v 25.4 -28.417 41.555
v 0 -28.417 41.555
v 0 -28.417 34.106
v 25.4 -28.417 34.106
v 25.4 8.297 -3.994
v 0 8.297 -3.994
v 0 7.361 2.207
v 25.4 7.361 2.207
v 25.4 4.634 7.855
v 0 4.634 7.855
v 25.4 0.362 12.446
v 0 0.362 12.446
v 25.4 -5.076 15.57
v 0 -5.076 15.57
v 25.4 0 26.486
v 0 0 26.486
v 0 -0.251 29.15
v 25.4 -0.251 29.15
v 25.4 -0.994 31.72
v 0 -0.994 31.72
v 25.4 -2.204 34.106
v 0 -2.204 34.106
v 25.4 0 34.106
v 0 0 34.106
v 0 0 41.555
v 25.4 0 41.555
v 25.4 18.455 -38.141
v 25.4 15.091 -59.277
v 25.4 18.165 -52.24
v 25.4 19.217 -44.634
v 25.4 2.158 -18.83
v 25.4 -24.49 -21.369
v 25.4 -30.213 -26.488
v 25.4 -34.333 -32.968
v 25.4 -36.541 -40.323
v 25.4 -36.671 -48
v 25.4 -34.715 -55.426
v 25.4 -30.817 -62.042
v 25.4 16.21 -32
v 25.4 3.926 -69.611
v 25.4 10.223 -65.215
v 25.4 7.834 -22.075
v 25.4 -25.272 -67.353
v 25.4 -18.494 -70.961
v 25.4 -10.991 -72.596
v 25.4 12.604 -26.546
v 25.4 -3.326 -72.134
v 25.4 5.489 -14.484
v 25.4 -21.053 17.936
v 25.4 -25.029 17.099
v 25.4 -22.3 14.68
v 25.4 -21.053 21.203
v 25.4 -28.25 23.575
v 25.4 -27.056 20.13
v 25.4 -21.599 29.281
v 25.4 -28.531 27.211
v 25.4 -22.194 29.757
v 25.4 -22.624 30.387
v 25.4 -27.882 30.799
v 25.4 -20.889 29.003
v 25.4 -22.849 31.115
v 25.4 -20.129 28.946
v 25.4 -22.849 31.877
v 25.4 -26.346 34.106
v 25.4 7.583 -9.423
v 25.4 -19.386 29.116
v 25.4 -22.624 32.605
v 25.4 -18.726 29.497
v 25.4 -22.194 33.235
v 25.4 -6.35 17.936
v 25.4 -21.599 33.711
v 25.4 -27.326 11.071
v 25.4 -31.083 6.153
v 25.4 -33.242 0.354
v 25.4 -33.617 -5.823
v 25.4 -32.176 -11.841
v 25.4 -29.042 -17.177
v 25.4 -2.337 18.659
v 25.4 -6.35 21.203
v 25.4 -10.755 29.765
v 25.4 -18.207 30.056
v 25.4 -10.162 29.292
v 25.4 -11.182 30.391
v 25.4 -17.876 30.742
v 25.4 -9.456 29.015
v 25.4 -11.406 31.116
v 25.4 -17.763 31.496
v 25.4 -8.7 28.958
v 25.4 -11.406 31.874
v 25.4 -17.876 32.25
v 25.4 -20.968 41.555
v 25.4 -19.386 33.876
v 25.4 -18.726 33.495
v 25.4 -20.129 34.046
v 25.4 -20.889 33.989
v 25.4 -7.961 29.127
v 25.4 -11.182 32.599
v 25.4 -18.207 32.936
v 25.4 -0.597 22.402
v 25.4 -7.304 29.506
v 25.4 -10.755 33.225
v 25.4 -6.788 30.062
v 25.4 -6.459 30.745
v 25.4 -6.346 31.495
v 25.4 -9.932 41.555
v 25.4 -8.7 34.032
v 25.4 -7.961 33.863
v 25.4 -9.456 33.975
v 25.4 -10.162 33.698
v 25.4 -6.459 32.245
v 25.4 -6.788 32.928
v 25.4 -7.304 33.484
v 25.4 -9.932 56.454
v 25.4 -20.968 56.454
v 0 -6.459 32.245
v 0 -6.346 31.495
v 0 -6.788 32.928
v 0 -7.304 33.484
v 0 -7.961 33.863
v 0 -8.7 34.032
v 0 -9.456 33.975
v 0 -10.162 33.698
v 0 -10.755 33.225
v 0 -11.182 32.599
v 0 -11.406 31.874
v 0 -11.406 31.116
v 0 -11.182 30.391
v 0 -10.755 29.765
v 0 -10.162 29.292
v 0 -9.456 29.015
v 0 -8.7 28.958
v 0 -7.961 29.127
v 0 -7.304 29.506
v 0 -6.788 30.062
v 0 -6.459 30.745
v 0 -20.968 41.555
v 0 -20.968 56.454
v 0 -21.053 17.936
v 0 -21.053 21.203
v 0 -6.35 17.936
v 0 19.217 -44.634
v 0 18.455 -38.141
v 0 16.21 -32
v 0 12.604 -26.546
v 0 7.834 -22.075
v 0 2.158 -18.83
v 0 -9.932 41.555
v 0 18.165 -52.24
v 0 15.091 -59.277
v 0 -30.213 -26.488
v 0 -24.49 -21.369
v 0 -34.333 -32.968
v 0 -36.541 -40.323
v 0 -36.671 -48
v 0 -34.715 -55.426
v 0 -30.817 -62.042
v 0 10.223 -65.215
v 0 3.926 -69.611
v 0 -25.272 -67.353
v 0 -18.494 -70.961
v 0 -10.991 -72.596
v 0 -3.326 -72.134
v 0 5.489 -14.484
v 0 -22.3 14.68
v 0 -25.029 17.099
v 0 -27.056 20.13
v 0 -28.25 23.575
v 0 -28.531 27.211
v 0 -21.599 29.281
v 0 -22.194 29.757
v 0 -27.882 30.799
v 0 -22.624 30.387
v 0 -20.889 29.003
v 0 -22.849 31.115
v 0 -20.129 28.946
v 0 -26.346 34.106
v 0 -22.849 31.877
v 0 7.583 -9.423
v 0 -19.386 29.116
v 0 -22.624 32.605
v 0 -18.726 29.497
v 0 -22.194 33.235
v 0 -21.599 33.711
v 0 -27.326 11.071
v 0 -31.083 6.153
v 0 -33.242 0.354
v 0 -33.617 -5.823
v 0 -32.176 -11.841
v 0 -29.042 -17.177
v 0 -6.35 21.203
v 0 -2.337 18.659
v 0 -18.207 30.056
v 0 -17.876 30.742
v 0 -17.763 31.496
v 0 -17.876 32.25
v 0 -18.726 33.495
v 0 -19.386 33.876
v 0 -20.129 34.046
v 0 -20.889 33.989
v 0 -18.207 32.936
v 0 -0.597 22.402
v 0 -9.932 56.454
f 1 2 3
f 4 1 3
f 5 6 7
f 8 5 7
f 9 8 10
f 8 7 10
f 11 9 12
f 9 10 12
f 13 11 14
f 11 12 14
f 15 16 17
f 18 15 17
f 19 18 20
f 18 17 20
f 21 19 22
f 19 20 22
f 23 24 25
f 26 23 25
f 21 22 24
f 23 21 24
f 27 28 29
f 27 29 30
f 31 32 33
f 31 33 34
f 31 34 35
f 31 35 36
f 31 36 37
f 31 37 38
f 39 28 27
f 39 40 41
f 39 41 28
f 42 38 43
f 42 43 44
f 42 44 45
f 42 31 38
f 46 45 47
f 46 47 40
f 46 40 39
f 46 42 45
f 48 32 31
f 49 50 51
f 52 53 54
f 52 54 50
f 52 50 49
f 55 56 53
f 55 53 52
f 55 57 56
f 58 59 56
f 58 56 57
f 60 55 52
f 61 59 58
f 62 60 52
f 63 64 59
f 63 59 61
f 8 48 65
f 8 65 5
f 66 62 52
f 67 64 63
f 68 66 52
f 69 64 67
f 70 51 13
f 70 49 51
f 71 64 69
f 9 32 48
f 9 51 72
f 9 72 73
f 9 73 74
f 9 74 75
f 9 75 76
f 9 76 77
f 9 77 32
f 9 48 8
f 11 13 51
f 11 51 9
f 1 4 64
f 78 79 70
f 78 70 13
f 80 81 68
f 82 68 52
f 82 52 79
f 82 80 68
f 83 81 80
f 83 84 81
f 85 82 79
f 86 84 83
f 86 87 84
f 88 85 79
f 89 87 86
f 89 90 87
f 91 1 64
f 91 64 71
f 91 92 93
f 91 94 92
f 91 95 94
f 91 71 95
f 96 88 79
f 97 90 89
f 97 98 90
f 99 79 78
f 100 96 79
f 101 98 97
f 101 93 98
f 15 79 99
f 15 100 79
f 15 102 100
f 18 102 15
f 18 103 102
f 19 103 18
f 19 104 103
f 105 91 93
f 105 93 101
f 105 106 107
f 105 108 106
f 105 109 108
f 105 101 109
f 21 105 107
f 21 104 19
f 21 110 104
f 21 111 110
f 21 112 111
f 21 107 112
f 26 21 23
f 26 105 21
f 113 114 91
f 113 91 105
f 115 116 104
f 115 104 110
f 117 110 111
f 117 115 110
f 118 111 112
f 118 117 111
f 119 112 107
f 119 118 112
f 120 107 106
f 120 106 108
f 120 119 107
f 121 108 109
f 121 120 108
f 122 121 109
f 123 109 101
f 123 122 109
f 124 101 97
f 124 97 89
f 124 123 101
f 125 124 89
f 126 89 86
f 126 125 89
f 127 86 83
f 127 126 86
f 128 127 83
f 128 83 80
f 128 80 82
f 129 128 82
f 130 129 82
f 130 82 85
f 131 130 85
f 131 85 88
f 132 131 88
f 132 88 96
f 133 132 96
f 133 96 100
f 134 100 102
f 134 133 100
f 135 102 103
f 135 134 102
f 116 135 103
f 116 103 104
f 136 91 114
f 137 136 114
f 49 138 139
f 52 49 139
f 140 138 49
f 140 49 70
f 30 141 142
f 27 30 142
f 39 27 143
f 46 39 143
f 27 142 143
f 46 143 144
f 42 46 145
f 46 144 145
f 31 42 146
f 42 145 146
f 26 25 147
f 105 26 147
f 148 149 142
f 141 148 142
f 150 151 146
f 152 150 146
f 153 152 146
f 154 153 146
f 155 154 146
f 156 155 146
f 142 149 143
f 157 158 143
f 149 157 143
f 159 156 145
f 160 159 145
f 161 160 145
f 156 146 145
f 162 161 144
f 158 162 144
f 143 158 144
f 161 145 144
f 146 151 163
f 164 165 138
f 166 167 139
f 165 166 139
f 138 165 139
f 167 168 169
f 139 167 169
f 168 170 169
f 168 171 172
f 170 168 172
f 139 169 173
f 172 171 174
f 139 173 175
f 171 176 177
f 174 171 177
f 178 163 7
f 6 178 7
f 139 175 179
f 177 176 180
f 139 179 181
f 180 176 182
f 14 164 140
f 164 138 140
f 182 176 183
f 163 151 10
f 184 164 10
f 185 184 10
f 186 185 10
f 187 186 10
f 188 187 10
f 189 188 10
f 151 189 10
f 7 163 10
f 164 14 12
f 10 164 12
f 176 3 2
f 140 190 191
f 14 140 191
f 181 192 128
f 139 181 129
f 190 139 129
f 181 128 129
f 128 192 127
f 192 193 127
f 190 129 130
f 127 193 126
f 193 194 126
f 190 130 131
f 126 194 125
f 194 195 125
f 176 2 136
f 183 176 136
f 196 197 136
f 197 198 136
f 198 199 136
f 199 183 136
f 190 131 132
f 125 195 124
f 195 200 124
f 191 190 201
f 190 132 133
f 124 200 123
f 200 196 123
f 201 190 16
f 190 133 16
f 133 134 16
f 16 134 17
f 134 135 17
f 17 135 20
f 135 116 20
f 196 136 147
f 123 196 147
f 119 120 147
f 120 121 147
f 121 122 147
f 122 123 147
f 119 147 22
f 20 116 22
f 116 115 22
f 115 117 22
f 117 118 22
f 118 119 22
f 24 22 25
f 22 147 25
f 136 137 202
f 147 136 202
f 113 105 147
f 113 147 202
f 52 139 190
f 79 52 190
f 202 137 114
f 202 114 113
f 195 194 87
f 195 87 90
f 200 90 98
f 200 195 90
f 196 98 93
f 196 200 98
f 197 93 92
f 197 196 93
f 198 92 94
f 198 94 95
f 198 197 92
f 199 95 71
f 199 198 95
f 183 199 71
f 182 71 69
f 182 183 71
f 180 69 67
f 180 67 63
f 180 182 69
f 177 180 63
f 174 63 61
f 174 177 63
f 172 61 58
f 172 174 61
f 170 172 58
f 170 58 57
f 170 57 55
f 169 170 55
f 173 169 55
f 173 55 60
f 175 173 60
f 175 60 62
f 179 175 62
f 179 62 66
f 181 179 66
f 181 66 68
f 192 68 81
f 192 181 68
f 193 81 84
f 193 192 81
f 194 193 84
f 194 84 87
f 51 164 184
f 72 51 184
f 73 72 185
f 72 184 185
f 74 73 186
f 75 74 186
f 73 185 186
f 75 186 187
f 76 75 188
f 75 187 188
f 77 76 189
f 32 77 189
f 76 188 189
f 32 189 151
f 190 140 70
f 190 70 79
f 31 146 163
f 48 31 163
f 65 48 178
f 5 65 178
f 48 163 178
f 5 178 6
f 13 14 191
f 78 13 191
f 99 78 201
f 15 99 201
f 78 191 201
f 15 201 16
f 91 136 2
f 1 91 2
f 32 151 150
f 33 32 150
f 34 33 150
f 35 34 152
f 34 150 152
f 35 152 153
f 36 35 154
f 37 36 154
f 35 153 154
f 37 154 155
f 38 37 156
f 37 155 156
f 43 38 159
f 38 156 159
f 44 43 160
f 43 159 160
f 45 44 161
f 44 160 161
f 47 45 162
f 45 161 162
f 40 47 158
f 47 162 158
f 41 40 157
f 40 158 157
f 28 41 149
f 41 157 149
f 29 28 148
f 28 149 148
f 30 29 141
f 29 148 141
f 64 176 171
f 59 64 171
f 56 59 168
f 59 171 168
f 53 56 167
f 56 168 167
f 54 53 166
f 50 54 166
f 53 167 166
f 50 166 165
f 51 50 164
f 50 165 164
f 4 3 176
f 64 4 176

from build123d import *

# Parameters (mm, degrees)
F0_W     = 11.0358623788
F0_H     = 14.8984193802
F1_DEPTH = 25.4
F2_DEPTH = 25.4
F3_R     = 2.5571153932
F3_R_2   = 2.5440351013
F3_W     = 14.7031287464
F3_H     = 3.2673614761
F4_DEPTH = 25.4


# Not quite as in the source:
# - the program builds the solid bodies; features that only make, move or delete a surface that nothing else refers to are left out


with BuildPart() as f1:
    # F0 (on Right) → F1 (new body)
    with BuildSketch(Plane.YZ):
        with BuildLine():
            ThreePointArc((-24.4896995825, -21.3687317689), (-22.0066937129, -69.3902825337), (19.2165729762, -44.633931036))
            ThreePointArc((19.2165729762, -44.633931036), (14.5664371428, -29.167684068), (2.1580914014, -18.8302997515))
            ThreePointArc((2.1580914014, -18.8302997515), (-10.7088530026, -24.8964679727), (-24.4896995825, -21.3687317689))
        make_face()
        with BuildLine():
            ThreePointArc((-24.4896995825, -21.3687317689), (-10.7088530026, -24.8964679727), (2.1580914014, -18.8302997515))
            ThreePointArc((2.1580914014, -18.8302997515), (-11.4882033251, -16.7150534797), (-24.4896995825, -21.3687317689))
        make_face()
        with BuildLine():
            ThreePointArc((-24.4896995825, -21.3687317689), (-11.4882033251, -16.7150534797), (2.1580914014, -18.8302997515))
            ThreePointArc((2.1580914014, -18.8302997515), (6.7017838768, -12.0221001394), (8.2971597307, -3.993931036))
            ThreePointArc((8.2971597307, -3.993931036), (4.6343580327, 7.8551511373), (-5.0761488644, 15.5702610153))
            ThreePointArc((-5.0761488644, 15.5702610153), (-13.5382573111, 12.2302712352), (-22.2995232661, 14.6803793882))
            ThreePointArc((-22.2995232661, 14.6803793882), (-33.6585141964, -2.7205891991), (-24.4896995825, -21.3687317689))
        make_face()
        with BuildLine():
            ThreePointArc((-26.3456820786, 34.106068964), (-28.2496986989, 23.5752529976), (-22.2995232661, 14.6803793882))
            ThreePointArc((-22.2995232661, 14.6803793882), (-13.7834170108, 16.9752588467), (-5.0761488644, 15.5702610153))
            ThreePointArc((-5.0761488644, 15.5702610153), (-1.3310983759, 20.4668881546), (0, 26.486068964))
            ThreePointArc((0, 26.486068964), (-0.5620509112, 30.4522310833), (-2.2039436985, 34.106068964))
            Line((-2.2039436985, 34.106068964), (-26.3456820786, 34.106068964))
        make_face()
        with BuildLine():
            ThreePointArc((-5.0761488644, 15.5702610153), (-13.7834170108, 16.9752588467), (-22.2995232661, 14.6803793882))
            ThreePointArc((-22.2995232661, 14.6803793882), (-13.5382573111, 12.2302712352), (-5.0761488644, 15.5702610153))
        make_face()
        with BuildLine():
            Line((-28.4173451364, 34.106068964), (-26.3456820786, 34.106068964))
            ThreePointArc((-26.3456820786, 34.106068964), (-14.2748128886, 40.7608818526), (-2.2039436985, 34.106068964))
            Line((-2.2039436985, 34.106068964), (0, 34.106068964))
            Line((0, 34.106068964), (0, 41.5552749288))
            Line((0, 41.5552749288), (-9.9322767928, 41.5552749288))
            Line((-9.9322767928, 41.5552749288), (-20.9681391716, 41.5552749288))
            Line((-20.9681391716, 41.5552749288), (-28.4173451364, 41.5552749288))
            Line((-28.4173451364, 41.5552749288), (-28.4173451364, 34.106068964))
        make_face()
        with BuildLine():
            ThreePointArc((-2.2039436985, 34.106068964), (-14.2748128886, 40.7608818526), (-26.3456820786, 34.106068964))
            Line((-26.3456820786, 34.106068964), (-2.2039436985, 34.106068964))
        make_face()
        with Locations((-15.4502079822, 49.0044846189)):
            Rectangle(F0_W, F0_H)
    extrude(amount=F1_DEPTH)

    # F0 (on Right) → F2 (join)
    with BuildSketch(Plane.YZ):
        with BuildLine():
            ThreePointArc((-24.4896995825, -21.3687317689), (-22.0066937129, -69.3902825337), (19.2165729762, -44.633931036))
            ThreePointArc((19.2165729762, -44.633931036), (14.5664371428, -29.167684068), (2.1580914014, -18.8302997515))
            ThreePointArc((2.1580914014, -18.8302997515), (-10.7088530026, -24.8964679727), (-24.4896995825, -21.3687317689))
        make_face()
        with BuildLine():
            ThreePointArc((-24.4896995825, -21.3687317689), (-10.7088530026, -24.8964679727), (2.1580914014, -18.8302997515))
            ThreePointArc((2.1580914014, -18.8302997515), (-11.4882033251, -16.7150534797), (-24.4896995825, -21.3687317689))
        make_face()
        with BuildLine():
            ThreePointArc((-24.4896995825, -21.3687317689), (-11.4882033251, -16.7150534797), (2.1580914014, -18.8302997515))
            ThreePointArc((2.1580914014, -18.8302997515), (6.7017838768, -12.0221001394), (8.2971597307, -3.993931036))
            ThreePointArc((8.2971597307, -3.993931036), (4.6343580327, 7.8551511373), (-5.0761488644, 15.5702610153))
            ThreePointArc((-5.0761488644, 15.5702610153), (-13.5382573111, 12.2302712352), (-22.2995232661, 14.6803793882))
            ThreePointArc((-22.2995232661, 14.6803793882), (-33.6585141964, -2.7205891991), (-24.4896995825, -21.3687317689))
        make_face()
        with BuildLine():
            ThreePointArc((-26.3456820786, 34.106068964), (-28.2496986989, 23.5752529976), (-22.2995232661, 14.6803793882))
            ThreePointArc((-22.2995232661, 14.6803793882), (-13.7834170108, 16.9752588467), (-5.0761488644, 15.5702610153))
            ThreePointArc((-5.0761488644, 15.5702610153), (-1.3310983759, 20.4668881546), (0, 26.486068964))
            ThreePointArc((0, 26.486068964), (-0.5620509112, 30.4522310833), (-2.2039436985, 34.106068964))
            Line((-2.2039436985, 34.106068964), (-26.3456820786, 34.106068964))
        make_face()
        with BuildLine():
            ThreePointArc((-5.0761488644, 15.5702610153), (-13.7834170108, 16.9752588467), (-22.2995232661, 14.6803793882))
            ThreePointArc((-22.2995232661, 14.6803793882), (-13.5382573111, 12.2302712352), (-5.0761488644, 15.5702610153))
        make_face()
        with BuildLine():
            Line((-28.4173451364, 34.106068964), (-26.3456820786, 34.106068964))
            ThreePointArc((-26.3456820786, 34.106068964), (-14.2748128886, 40.7608818526), (-2.2039436985, 34.106068964))
            Line((-2.2039436985, 34.106068964), (0, 34.106068964))
            Line((0, 34.106068964), (0, 41.5552749288))
            Line((0, 41.5552749288), (-9.9322767928, 41.5552749288))
            Line((-9.9322767928, 41.5552749288), (-20.9681391716, 41.5552749288))
            Line((-20.9681391716, 41.5552749288), (-28.4173451364, 41.5552749288))
            Line((-28.4173451364, 41.5552749288), (-28.4173451364, 34.106068964))
        make_face()
        with BuildLine():
            ThreePointArc((-2.2039436985, 34.106068964), (-14.2748128886, 40.7608818526), (-26.3456820786, 34.106068964))
            Line((-26.3456820786, 34.106068964), (-2.2039436985, 34.106068964))
        make_face()
        with Locations((-15.4502079822, 49.0044846189)):
            Rectangle(F0_W, F0_H)
    extrude(amount=F2_DEPTH)

    # F3 (on Right) → F4 (cut)
    with BuildSketch(Plane.YZ):
        with Locations((-20.32, 31.496)):
            Circle(F3_R)
        with Locations((-8.89, 31.4950787105)):
            Circle(F3_R_2)
        with Locations((-13.7015643732, 19.5692073871)):
            Rectangle(F3_W, F3_H)
    extrude(amount=F4_DEPTH, mode=Mode.SUBTRACT)


solid = f1.part
